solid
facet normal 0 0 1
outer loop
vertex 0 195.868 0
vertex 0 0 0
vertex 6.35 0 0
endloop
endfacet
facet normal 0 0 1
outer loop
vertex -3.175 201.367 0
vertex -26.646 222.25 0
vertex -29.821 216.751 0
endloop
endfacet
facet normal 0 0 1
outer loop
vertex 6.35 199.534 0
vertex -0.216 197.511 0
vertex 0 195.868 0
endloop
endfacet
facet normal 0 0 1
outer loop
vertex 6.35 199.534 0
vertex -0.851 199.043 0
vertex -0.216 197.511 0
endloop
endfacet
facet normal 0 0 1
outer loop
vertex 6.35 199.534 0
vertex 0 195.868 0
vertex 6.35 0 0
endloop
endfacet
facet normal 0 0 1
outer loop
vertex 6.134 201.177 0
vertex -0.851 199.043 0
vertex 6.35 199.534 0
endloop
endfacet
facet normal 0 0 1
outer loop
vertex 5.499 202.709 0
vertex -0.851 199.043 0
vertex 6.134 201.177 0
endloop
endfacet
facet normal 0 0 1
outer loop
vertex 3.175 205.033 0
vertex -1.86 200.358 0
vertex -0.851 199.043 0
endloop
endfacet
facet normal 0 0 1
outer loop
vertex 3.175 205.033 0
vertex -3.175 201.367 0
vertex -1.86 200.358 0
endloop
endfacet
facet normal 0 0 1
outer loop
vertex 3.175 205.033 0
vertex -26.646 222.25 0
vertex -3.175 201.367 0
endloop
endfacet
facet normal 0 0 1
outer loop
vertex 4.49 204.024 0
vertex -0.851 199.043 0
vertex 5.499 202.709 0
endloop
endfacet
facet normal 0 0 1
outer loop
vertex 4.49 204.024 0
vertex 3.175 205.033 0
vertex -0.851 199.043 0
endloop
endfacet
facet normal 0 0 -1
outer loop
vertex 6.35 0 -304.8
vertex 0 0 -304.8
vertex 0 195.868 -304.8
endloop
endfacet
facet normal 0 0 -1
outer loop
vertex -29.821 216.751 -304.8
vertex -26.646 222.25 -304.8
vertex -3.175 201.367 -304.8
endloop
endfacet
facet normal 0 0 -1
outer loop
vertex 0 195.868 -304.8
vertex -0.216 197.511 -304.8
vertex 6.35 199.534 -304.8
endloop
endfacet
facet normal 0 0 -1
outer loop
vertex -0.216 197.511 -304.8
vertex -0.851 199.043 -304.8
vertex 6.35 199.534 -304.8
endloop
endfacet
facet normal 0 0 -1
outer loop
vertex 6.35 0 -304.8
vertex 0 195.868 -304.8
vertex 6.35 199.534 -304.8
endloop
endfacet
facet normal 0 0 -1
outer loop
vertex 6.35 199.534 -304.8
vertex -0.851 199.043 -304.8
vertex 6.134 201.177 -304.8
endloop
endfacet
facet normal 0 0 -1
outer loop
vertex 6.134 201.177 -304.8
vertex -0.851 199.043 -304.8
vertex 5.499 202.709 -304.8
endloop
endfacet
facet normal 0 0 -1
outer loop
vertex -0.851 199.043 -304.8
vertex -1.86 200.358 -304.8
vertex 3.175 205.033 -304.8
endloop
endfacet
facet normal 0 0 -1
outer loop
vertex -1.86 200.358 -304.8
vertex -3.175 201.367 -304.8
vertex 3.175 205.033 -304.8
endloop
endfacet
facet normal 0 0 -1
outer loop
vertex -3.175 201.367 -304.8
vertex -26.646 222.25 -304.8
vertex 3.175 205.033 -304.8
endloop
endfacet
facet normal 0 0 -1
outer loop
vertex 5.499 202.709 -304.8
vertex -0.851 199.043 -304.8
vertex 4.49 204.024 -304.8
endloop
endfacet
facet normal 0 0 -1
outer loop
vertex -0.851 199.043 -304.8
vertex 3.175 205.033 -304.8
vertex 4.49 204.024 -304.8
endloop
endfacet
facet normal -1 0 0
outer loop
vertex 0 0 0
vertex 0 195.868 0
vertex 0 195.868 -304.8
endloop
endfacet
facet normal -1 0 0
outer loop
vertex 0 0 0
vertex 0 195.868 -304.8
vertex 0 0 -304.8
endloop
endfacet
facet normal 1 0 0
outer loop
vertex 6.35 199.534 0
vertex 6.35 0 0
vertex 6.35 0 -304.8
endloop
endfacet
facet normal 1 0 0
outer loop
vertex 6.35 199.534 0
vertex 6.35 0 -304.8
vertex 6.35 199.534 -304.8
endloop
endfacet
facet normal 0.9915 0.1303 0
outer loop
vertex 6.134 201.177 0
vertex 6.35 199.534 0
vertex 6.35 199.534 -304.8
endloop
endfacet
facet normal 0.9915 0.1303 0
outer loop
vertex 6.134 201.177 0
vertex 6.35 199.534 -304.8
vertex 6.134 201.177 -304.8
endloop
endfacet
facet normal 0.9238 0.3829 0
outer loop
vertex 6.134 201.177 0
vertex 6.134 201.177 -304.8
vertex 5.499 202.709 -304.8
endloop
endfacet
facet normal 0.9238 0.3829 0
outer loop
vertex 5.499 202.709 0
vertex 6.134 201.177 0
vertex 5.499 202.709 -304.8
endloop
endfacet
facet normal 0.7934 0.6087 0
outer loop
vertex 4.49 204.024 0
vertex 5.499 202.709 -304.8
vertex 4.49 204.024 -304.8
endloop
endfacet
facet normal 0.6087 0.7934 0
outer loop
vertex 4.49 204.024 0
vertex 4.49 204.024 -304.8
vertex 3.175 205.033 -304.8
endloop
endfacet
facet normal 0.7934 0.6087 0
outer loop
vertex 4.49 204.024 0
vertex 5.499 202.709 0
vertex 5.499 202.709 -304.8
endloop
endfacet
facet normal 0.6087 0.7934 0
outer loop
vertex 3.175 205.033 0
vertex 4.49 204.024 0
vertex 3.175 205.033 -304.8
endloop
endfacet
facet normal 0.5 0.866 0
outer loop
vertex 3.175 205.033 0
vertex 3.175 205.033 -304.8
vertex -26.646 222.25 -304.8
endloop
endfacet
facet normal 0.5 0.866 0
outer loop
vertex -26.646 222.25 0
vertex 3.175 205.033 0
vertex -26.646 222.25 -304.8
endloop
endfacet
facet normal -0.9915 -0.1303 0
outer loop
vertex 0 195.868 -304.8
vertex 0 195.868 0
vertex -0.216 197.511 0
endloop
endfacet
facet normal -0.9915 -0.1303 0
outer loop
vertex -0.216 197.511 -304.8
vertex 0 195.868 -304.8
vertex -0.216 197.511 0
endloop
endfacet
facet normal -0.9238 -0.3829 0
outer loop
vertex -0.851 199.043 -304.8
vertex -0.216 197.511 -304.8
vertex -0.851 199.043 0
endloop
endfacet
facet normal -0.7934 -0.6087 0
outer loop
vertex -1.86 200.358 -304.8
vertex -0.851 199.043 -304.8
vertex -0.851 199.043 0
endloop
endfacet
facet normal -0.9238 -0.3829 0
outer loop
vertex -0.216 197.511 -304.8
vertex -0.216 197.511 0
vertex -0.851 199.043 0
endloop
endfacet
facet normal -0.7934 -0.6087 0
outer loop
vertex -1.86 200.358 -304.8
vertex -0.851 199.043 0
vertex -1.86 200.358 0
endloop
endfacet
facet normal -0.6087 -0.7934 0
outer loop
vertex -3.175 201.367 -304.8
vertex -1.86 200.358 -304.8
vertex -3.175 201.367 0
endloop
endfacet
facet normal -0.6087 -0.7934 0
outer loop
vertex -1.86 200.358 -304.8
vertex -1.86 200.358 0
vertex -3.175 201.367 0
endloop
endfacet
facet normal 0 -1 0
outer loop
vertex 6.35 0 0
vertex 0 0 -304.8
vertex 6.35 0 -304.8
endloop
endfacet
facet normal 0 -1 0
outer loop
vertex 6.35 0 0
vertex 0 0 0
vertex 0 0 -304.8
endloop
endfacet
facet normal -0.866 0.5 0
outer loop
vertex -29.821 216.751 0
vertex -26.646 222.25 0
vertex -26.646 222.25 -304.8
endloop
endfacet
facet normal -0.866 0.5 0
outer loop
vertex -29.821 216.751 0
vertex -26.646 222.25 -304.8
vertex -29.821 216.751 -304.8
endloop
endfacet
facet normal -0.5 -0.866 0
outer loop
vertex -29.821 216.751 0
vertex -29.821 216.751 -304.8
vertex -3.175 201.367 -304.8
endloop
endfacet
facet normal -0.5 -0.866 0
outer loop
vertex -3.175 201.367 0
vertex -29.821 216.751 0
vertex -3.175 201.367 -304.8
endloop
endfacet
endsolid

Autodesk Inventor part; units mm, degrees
ref_plane "YZ Plane" through (0, 0, 0) normal (1, 0, 0) x (0, 1, 0)
ref_plane "XZ Plane" through (0, 0, 0) normal (0, 1, 0) x (-1, 0, 0)
ref_plane "XY Plane" through (0, 0, 0) normal (0, 0, 1) x (1, 0, 0)
sketch "Sketch1" plane through (0, 0, 0) normal (0, 0, 1) x (1, 0, 0)
  line L0 (0, 0) -> (6.35, 0)
  line L1 (6.35, 0) -> (6.35, 203.2)
  line L2 (6.35, 203.2) -> (-26.6456, 222.25)
  line L3 (-26.6456, 222.25) -> (-29.8206, 216.7507)
  line L4 (-29.8206, 216.7507) -> (-3.175, 201.3669)
  line L5 (0, 195.8677) -> (0, 0)
  arc A0 (6.35, 199.5338) -> (3.175, 205.0331) centre (0, 199.5338) ccw
  arc A1 (0, 195.8677) -> (-3.175, 201.3669) centre (-6.35, 195.8677) ccw
  dimension "d0" = 6.35
  dimension "d1" = 6.35
  dimension "d2" = 120
  dimension "d3" = 38.1
  dimension "d4" = 203.2
  dimension "d6" = 6.35
extrude "Extrusion1" add sketch "Sketch1" against normal blind 304.8 contours L5 A1 L4 L3 L2 A0 L1 L0
properties part number "GE-13044" material "Polycarbonate, Clear"
